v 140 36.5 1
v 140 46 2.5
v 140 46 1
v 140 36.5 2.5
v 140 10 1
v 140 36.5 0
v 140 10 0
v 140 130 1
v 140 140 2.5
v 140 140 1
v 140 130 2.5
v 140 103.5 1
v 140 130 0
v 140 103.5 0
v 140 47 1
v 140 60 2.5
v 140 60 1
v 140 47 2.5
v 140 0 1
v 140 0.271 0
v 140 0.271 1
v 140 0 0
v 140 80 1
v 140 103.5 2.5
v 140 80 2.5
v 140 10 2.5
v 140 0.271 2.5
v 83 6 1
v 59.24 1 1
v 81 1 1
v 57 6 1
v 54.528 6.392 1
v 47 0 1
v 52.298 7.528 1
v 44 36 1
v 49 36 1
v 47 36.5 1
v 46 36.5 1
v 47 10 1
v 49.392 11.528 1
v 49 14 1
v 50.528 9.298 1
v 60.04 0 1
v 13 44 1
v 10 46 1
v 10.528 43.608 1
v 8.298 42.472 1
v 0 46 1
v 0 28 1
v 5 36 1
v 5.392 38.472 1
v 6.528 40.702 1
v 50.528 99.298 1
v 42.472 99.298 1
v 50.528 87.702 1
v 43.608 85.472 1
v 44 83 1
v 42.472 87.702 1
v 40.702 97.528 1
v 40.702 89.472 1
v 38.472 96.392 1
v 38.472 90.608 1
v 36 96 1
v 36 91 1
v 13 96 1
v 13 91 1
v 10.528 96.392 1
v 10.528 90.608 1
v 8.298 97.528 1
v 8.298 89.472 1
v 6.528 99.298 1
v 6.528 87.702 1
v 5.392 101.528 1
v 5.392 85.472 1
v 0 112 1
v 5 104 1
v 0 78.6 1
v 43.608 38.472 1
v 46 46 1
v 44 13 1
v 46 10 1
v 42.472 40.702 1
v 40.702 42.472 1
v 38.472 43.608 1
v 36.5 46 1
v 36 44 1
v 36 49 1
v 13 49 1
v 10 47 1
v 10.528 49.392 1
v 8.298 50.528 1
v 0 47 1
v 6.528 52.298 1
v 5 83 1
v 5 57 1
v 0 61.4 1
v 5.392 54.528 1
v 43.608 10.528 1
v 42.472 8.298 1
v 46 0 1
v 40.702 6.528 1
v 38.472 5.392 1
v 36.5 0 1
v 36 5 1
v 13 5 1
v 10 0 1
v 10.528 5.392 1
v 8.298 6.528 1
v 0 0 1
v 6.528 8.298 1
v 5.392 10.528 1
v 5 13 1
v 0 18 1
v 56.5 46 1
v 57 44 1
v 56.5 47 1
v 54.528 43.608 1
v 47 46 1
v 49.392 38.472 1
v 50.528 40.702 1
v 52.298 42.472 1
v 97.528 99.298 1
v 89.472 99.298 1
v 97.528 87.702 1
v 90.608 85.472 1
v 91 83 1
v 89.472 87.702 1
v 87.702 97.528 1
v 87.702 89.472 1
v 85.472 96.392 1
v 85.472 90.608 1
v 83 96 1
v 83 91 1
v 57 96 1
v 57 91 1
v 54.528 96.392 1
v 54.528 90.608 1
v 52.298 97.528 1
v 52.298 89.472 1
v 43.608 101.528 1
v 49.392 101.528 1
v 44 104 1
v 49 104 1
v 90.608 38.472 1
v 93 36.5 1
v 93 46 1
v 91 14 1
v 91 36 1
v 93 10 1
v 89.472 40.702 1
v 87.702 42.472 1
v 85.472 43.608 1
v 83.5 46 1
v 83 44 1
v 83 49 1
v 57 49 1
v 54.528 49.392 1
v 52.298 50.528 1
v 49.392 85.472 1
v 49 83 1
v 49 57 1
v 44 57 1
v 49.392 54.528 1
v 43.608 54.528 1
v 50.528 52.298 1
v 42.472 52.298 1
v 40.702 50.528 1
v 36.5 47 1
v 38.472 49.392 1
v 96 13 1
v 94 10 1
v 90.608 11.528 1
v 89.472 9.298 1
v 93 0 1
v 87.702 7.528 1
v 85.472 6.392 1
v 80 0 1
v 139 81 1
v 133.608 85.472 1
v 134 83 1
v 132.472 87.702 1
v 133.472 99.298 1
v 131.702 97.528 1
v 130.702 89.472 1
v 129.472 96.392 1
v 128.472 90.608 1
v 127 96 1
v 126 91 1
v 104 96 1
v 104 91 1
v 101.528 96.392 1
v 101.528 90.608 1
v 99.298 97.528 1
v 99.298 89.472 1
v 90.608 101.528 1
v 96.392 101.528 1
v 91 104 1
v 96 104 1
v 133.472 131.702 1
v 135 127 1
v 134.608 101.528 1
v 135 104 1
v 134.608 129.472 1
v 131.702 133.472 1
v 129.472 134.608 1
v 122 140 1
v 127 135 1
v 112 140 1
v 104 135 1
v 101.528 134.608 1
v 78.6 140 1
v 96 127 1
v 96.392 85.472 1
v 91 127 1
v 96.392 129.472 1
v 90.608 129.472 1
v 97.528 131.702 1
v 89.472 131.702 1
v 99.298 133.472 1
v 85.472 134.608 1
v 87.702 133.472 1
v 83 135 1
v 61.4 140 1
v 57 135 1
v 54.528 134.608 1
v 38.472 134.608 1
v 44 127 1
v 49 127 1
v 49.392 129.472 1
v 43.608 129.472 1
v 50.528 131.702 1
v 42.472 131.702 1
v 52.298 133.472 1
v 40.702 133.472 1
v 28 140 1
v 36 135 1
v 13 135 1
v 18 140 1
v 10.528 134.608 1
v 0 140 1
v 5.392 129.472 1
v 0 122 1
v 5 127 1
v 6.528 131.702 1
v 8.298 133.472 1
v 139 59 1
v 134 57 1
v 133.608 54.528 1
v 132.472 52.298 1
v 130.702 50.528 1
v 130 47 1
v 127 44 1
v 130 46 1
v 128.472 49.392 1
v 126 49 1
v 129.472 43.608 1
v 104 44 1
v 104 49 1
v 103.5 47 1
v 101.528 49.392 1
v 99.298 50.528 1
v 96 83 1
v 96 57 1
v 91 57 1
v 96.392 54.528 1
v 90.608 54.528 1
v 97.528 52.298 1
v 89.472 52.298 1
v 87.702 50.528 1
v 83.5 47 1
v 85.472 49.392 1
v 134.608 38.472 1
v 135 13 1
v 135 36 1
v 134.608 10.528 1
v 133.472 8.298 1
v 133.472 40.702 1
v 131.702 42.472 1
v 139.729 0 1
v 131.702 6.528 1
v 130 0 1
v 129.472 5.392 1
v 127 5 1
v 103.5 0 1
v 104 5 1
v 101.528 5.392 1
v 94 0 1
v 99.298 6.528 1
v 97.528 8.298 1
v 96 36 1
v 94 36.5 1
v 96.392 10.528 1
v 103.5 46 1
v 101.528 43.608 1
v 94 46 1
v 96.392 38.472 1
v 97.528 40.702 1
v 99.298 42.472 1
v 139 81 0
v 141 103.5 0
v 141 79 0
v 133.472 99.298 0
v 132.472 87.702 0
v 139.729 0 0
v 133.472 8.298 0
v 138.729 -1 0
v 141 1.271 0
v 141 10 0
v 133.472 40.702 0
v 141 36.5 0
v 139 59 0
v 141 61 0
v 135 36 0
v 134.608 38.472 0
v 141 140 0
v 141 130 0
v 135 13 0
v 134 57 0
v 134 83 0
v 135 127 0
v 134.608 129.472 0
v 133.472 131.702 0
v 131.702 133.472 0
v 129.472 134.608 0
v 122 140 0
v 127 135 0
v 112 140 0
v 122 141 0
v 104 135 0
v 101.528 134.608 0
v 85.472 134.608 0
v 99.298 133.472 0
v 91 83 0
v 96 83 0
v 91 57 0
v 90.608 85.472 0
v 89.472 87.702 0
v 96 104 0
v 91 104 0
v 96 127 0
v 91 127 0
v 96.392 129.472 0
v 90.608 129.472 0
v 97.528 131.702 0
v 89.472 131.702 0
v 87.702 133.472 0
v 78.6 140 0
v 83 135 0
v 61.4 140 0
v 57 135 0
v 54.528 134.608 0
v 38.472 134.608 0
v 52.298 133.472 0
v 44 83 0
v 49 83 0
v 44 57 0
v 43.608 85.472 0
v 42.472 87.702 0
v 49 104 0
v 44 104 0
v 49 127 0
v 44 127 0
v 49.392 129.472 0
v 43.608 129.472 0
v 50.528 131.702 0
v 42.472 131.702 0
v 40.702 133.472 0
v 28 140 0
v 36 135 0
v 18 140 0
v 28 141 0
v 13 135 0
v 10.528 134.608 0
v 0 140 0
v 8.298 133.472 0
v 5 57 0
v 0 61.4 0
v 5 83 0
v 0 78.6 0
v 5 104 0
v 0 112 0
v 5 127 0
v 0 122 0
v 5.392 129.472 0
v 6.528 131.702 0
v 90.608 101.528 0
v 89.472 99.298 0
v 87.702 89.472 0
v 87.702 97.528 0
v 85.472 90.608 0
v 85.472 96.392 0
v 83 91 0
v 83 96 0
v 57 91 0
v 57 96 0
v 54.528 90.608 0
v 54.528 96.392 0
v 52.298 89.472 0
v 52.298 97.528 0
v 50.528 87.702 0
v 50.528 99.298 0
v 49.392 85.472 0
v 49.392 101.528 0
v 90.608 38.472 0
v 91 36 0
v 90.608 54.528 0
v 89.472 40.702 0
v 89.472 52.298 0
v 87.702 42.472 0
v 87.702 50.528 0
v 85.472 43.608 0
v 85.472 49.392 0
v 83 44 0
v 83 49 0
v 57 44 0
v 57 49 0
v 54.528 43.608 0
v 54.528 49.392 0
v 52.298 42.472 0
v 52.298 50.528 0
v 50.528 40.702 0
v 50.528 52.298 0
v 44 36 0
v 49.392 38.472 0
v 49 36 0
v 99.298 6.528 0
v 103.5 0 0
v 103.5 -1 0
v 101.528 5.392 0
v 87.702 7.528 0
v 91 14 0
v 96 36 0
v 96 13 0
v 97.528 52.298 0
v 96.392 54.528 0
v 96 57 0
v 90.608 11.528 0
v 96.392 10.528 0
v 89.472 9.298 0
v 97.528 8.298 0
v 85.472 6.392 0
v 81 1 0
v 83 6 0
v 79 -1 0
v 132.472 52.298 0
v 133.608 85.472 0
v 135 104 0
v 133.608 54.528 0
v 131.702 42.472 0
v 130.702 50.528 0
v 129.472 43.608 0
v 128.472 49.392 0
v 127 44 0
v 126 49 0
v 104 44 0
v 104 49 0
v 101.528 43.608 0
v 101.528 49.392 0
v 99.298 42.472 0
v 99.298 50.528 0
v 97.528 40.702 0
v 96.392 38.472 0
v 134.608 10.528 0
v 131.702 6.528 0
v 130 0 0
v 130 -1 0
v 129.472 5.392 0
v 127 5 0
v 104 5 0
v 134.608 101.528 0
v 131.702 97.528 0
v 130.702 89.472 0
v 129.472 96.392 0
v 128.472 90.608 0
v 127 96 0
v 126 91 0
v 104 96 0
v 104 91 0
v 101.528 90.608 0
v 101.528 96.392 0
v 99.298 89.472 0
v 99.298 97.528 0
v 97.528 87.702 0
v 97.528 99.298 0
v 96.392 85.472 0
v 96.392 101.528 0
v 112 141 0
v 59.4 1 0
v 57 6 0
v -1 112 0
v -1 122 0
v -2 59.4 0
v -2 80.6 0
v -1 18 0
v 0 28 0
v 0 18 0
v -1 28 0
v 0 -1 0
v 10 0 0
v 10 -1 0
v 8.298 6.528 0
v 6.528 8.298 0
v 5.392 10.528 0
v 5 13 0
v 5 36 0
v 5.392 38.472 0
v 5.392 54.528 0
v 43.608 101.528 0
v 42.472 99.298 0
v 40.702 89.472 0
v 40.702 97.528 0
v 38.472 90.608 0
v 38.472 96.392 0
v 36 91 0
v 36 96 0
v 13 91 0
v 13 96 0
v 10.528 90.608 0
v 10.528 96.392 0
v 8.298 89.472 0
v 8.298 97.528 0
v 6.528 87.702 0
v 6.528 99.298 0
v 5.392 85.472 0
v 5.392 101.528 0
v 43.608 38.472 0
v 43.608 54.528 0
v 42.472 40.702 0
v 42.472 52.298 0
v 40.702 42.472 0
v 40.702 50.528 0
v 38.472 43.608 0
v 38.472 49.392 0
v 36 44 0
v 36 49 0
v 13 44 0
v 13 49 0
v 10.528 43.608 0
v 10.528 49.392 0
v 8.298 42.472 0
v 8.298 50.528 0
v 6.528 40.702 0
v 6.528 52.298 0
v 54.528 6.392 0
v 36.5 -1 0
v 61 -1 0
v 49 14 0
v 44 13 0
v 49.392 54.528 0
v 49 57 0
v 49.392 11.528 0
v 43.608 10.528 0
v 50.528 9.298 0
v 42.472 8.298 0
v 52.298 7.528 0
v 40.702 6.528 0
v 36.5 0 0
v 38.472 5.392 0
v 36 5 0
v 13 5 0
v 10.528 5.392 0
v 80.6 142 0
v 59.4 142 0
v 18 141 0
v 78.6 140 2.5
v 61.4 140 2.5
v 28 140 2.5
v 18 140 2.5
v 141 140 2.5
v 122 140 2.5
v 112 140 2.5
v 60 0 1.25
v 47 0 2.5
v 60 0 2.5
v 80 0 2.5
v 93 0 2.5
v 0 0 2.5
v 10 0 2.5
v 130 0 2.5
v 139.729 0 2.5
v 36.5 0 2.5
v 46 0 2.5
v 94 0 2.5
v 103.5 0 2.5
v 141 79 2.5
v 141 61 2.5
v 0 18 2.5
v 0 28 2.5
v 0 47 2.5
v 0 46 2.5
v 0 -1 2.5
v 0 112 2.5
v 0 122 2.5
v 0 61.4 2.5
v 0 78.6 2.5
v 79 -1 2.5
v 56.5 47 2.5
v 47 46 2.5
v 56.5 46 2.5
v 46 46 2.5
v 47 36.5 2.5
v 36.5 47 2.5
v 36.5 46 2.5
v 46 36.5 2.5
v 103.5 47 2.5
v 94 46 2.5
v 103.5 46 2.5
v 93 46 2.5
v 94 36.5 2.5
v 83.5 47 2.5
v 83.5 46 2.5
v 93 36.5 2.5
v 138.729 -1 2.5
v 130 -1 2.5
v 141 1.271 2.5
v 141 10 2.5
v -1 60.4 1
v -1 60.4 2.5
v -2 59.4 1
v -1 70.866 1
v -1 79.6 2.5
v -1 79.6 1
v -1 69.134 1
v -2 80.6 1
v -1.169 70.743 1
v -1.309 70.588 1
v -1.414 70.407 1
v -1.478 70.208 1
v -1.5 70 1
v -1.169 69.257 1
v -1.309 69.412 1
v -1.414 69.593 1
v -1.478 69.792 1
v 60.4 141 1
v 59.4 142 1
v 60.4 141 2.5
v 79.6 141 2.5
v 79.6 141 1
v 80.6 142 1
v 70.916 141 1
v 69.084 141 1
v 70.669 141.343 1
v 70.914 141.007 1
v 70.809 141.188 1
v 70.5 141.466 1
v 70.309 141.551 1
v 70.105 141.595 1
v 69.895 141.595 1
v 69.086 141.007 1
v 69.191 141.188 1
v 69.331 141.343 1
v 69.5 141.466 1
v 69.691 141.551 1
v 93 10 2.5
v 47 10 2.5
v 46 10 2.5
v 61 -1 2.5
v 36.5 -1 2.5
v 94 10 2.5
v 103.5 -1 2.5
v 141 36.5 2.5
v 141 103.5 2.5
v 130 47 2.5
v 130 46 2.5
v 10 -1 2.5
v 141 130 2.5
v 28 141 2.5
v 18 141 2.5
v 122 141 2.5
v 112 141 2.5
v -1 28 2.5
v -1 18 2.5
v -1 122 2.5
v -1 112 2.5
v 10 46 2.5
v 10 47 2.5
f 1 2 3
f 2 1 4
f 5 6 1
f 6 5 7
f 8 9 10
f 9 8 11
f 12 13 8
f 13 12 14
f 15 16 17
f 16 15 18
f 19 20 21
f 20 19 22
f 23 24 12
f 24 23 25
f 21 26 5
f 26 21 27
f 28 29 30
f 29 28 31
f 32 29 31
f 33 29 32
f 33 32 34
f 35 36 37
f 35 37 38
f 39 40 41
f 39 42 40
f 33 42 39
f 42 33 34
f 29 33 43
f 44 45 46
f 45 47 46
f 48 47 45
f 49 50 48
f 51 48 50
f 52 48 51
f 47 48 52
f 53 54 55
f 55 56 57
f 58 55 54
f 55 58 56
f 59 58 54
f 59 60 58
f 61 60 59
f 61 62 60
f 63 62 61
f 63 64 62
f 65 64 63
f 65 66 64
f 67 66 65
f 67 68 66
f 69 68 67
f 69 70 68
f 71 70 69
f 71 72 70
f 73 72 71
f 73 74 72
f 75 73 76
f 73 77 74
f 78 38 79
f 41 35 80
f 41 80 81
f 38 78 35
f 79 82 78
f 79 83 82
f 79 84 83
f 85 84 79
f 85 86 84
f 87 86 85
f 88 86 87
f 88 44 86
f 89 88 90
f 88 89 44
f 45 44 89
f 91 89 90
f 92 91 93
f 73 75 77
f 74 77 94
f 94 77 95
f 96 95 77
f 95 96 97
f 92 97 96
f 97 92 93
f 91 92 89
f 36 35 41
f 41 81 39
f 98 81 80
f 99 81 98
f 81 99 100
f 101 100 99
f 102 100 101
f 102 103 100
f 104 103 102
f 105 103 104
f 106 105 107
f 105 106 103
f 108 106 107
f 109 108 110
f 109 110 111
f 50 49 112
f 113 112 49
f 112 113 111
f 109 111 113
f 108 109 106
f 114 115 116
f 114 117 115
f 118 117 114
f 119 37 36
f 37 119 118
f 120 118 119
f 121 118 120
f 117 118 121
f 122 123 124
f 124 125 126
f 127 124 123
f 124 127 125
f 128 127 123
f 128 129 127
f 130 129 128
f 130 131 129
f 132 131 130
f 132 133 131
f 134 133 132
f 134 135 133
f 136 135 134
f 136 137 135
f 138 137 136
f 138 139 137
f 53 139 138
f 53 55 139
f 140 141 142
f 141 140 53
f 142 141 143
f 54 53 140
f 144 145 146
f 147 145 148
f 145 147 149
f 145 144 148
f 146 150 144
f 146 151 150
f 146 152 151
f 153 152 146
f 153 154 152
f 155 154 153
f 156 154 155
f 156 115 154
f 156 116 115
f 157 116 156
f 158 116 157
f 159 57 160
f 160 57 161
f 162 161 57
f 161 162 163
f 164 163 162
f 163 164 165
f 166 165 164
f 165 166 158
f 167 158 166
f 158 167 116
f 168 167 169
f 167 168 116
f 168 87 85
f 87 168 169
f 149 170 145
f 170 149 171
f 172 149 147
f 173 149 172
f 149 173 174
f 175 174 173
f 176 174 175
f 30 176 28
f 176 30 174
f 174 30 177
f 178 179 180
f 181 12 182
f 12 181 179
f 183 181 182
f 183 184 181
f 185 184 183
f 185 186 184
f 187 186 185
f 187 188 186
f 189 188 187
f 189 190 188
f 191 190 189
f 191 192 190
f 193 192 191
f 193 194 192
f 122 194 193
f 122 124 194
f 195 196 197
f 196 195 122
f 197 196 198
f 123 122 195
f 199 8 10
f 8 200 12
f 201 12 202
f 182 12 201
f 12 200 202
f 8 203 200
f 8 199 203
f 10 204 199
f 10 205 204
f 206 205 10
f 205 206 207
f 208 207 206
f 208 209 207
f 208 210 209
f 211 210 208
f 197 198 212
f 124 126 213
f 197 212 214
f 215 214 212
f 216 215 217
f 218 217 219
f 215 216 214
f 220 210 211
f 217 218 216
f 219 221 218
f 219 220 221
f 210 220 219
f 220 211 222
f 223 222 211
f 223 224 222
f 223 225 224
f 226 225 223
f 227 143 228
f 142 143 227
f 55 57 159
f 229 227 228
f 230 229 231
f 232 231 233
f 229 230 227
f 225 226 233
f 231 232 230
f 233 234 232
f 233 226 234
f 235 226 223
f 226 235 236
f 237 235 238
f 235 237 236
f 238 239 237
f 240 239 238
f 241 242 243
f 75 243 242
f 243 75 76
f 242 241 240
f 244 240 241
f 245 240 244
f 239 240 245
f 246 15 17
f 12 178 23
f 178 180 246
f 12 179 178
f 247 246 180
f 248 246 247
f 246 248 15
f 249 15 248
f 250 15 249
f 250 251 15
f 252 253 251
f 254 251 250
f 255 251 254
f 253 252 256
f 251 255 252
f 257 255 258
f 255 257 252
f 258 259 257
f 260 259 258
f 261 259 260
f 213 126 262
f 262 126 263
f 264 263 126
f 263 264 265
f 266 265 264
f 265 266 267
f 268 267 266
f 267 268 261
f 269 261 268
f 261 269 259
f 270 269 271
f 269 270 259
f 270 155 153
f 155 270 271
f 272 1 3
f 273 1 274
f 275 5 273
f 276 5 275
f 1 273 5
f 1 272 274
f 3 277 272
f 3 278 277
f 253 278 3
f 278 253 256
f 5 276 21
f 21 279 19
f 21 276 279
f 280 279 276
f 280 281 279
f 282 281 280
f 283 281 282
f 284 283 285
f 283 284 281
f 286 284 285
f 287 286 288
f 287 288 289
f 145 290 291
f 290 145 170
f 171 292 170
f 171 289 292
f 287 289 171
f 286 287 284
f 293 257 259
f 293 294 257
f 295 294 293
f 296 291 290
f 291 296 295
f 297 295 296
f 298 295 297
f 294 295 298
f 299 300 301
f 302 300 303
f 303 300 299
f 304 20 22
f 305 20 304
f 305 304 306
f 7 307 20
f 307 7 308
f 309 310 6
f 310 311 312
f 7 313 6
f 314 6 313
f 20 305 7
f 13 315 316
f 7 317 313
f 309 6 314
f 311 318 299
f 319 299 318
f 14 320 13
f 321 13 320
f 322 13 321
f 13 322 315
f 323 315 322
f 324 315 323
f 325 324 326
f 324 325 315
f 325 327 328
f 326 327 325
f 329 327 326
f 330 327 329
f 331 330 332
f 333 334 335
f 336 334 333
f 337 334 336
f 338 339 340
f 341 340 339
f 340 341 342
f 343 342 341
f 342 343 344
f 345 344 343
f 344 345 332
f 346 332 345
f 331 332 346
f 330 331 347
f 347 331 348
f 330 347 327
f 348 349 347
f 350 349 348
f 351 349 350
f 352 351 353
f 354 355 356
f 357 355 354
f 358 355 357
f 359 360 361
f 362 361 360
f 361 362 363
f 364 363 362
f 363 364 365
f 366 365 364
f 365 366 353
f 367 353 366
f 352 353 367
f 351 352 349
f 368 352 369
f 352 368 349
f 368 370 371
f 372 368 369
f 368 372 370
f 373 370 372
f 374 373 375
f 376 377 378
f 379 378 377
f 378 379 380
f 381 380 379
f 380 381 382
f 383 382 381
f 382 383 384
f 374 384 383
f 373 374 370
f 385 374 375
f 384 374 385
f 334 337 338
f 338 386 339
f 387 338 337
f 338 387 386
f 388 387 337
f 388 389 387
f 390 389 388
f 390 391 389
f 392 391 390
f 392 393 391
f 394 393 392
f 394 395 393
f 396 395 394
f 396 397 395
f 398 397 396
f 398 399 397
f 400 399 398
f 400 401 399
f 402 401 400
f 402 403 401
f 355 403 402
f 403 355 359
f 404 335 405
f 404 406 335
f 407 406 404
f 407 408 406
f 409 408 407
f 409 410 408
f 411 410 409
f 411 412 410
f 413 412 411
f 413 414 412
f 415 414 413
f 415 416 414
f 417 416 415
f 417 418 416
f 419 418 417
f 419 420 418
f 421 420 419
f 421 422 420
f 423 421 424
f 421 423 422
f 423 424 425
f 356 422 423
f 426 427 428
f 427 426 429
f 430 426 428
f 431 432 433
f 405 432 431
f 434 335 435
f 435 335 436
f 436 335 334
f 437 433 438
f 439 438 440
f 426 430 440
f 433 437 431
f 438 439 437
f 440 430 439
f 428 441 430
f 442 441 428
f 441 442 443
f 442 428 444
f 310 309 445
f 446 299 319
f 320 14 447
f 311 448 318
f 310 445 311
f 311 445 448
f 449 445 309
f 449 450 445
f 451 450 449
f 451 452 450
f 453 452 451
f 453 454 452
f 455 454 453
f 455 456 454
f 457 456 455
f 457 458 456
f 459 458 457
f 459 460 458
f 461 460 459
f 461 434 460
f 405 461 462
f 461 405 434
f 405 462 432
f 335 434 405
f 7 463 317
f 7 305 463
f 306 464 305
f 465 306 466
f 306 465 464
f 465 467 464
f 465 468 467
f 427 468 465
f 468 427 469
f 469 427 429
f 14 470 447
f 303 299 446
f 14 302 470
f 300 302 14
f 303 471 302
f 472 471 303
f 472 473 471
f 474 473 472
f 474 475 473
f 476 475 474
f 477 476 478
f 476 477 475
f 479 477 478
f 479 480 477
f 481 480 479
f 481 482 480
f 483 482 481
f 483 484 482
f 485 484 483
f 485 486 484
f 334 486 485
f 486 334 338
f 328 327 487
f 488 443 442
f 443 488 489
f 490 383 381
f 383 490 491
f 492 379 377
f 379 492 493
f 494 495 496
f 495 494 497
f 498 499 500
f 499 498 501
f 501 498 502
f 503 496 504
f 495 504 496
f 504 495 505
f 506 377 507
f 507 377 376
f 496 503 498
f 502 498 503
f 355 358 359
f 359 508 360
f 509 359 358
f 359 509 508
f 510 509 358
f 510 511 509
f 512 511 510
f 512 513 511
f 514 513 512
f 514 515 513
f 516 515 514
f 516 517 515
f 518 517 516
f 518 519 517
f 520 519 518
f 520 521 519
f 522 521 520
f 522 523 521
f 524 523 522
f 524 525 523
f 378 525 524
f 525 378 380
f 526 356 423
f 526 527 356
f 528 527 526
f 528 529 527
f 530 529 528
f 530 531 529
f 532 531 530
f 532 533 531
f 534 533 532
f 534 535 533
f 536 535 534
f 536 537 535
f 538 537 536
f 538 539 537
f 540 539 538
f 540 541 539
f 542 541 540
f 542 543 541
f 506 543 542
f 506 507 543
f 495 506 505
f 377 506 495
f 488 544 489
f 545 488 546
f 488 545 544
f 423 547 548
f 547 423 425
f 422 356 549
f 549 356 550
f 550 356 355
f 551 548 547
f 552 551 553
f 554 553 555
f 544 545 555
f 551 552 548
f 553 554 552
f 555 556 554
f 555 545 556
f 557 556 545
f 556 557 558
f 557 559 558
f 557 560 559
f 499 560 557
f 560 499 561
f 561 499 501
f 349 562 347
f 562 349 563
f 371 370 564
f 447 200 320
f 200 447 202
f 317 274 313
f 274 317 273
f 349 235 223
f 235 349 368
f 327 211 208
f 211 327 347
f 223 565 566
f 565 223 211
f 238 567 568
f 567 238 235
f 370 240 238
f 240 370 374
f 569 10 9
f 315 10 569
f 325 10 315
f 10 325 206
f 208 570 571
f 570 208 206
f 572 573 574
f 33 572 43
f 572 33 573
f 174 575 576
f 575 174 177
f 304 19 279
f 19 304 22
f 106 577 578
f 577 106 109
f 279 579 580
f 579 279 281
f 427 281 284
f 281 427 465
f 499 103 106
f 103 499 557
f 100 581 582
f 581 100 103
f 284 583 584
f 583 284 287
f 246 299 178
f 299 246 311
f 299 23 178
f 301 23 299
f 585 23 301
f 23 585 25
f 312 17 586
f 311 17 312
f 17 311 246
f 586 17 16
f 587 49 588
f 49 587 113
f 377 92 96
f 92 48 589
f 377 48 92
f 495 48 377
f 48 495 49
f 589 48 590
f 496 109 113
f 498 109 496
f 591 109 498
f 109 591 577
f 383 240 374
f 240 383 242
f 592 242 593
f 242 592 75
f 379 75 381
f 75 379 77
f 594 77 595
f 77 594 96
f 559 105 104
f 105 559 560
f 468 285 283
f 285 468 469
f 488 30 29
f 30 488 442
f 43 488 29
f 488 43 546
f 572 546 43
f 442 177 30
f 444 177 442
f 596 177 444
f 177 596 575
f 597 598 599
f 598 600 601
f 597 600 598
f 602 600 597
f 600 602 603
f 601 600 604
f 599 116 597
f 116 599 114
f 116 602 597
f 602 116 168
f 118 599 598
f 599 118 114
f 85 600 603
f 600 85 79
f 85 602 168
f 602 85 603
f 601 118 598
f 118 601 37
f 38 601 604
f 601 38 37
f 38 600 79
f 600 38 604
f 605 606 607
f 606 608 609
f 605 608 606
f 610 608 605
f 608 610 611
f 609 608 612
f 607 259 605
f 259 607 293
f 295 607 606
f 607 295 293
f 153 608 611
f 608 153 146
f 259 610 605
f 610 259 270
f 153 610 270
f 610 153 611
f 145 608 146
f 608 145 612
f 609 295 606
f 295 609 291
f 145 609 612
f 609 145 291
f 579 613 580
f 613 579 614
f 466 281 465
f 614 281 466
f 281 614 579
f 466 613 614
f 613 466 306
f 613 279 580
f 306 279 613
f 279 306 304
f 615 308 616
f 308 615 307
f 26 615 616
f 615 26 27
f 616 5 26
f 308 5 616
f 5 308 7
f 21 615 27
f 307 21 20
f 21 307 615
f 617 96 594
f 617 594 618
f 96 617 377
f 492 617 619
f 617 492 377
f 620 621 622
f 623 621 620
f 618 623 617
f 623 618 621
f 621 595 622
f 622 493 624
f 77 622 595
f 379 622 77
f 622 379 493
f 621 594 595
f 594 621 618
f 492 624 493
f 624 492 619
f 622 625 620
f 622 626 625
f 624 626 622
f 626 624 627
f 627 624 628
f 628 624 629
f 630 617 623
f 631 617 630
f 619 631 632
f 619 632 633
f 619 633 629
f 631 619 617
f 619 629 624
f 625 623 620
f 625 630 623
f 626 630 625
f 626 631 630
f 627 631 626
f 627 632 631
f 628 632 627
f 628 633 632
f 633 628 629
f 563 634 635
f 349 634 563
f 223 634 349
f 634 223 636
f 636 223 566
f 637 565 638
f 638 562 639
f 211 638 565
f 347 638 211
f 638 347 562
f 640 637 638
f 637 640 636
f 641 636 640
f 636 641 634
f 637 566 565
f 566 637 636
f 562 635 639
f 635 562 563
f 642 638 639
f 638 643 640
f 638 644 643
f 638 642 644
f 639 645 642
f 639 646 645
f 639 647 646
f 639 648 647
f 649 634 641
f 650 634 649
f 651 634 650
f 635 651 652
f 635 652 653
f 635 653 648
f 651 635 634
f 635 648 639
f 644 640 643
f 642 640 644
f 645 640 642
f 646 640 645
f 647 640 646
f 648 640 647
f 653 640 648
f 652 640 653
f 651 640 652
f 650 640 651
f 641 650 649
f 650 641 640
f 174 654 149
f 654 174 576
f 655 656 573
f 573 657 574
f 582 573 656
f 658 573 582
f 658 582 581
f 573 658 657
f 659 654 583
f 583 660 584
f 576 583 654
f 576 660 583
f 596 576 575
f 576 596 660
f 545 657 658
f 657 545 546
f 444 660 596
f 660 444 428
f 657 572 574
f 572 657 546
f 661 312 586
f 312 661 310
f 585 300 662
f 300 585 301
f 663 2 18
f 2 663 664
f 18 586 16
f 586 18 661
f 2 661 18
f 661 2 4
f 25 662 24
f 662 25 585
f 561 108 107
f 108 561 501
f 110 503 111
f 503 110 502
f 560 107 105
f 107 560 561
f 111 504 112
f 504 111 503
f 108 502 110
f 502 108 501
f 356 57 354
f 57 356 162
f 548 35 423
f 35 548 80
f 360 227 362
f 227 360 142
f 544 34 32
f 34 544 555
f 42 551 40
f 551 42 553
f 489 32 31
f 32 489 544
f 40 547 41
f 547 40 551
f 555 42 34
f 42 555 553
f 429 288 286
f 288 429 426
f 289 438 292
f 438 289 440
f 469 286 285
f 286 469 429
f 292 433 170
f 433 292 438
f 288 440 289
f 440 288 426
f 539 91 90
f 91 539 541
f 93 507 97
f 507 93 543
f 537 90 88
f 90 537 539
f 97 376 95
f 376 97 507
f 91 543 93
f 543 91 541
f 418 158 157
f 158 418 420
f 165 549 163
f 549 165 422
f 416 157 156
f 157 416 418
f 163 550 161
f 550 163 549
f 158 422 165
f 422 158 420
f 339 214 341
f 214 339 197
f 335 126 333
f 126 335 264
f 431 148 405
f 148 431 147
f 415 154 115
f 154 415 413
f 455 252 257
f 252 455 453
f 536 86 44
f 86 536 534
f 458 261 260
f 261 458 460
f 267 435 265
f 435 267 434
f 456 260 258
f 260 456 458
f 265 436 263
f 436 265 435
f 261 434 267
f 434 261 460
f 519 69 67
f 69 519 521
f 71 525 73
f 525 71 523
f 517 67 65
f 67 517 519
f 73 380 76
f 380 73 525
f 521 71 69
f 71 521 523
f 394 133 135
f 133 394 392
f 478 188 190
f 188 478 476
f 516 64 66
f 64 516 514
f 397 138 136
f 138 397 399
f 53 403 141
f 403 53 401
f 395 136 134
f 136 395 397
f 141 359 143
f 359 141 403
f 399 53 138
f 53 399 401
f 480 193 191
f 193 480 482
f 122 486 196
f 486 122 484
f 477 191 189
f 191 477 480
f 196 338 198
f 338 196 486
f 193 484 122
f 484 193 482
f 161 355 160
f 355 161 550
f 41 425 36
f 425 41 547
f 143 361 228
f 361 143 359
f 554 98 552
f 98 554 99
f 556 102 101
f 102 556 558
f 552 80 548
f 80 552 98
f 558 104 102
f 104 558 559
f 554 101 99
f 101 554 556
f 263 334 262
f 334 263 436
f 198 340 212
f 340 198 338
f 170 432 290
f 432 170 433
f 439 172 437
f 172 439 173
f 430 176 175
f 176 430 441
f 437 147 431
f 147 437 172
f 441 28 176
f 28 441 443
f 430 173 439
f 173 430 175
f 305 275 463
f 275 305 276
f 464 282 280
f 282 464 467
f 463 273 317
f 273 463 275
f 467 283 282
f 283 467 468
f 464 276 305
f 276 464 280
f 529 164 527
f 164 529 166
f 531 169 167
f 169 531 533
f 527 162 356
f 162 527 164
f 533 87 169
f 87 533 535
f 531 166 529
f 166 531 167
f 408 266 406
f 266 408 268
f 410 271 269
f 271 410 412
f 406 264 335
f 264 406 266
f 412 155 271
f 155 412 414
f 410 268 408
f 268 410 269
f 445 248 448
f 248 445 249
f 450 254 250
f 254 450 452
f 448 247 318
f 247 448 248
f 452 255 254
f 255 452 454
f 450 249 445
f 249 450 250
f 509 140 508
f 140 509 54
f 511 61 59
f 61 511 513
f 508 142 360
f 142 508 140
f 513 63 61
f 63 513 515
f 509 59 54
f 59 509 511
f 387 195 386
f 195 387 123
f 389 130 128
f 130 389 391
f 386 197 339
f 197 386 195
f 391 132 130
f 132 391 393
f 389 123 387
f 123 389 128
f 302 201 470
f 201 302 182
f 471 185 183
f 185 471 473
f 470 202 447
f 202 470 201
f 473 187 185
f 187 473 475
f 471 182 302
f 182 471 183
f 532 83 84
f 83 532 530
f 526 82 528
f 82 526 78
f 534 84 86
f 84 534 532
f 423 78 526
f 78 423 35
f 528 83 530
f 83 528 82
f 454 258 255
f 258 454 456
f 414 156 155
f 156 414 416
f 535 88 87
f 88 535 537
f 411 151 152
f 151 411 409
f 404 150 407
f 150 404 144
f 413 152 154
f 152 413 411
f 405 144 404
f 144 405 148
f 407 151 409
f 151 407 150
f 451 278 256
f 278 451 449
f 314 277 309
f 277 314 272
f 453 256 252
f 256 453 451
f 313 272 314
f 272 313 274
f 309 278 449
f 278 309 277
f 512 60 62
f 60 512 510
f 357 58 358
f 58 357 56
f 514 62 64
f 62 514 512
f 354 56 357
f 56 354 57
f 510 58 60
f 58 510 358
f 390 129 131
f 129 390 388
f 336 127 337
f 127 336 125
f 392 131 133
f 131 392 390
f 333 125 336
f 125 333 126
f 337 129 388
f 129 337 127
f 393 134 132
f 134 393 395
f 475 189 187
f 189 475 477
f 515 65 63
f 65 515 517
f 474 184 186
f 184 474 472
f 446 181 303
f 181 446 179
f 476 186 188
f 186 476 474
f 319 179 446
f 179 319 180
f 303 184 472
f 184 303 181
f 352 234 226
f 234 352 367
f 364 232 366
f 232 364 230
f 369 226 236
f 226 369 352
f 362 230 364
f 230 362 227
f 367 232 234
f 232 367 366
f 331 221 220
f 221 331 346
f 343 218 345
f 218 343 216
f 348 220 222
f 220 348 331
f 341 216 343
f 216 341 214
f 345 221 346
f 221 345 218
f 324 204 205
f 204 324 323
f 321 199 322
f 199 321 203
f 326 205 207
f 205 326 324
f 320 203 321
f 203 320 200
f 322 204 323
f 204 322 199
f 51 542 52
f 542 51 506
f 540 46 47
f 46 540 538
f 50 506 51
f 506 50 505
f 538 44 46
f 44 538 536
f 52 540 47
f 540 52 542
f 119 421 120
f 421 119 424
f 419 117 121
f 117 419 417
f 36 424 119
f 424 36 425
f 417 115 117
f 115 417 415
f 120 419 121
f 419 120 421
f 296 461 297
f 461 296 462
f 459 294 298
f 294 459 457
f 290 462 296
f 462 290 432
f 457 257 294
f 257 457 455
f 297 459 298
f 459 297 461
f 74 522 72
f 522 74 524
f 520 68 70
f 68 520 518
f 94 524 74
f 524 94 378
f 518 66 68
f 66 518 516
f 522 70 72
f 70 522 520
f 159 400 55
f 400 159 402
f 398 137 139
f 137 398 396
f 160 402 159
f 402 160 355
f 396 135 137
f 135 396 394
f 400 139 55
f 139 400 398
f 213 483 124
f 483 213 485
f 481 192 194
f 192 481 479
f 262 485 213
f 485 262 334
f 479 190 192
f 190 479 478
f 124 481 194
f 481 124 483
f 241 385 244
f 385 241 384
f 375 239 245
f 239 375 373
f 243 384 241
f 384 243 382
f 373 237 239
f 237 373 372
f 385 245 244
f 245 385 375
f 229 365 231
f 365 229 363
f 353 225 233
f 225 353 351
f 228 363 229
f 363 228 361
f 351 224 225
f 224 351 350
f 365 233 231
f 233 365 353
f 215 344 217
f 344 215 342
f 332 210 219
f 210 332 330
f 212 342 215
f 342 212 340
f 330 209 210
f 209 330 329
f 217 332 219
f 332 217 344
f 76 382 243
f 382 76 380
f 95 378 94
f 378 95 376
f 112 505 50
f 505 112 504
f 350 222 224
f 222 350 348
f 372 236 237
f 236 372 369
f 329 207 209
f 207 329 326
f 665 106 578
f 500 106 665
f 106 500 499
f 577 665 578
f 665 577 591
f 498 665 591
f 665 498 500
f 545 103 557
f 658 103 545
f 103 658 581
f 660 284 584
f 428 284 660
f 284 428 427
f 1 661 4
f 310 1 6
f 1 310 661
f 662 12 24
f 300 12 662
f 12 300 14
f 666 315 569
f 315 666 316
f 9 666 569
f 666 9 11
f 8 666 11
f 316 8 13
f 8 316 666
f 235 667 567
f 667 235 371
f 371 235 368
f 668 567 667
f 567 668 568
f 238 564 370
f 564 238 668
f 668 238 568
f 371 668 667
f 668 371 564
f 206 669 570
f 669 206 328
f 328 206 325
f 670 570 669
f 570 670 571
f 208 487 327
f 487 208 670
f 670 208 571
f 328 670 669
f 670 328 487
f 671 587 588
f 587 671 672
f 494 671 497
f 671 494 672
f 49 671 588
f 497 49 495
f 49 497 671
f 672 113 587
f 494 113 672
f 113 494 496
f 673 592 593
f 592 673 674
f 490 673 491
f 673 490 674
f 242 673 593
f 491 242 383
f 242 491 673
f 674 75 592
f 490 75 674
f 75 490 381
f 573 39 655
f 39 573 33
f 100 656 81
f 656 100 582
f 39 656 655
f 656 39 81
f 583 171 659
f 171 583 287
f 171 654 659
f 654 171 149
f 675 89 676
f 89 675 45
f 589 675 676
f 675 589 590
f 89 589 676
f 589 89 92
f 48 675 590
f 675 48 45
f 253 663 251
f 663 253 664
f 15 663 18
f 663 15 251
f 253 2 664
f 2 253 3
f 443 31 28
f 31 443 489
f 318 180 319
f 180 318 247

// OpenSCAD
baseheight = 1;
wallheight = 2.5;
wallwidth = 1;
crosslength = 20;
tileside = 46;
floorwidth = 5;
totalwidth = 3*tileside+2*wallwidth;
firstdividecenter = tileside+wallwidth/2;
seconddividecenter = tileside*2+wallwidth+wallwidth/2;
centerfirsttile = tileside/2;
centersecondtile = tileside+wallwidth+tileside/2;
centerthirdtile = tileside*2+wallwidth*2+tileside/2;
dovewidth = 17.2;
negdovewidth = 18;
cornerradius = 8; //4;

module centercross (xpos, ypos, zpos) {
	translate( [xpos, ypos, zpos]) 
		translate ([-crosslength/2,-wallwidth/2, 0]) cube ([crosslength, wallwidth, wallheight]);
	translate ( [xpos, ypos, zpos])
		translate ([-wallwidth/2,-crosslength/2, 0]) cube ([wallwidth, crosslength, wallheight]);
} // module

module centerT (xpos, ypos, zpos, rotation) {
    translate( [xpos, ypos, zpos]) rotate([0, 0, rotation]) 
        translate ([-crosslength/2,-wallwidth/2, 0]) cube ([crosslength, wallwidth, wallheight]);
    translate ( [xpos, ypos, zpos]) rotate([0, 0, rotation]) 
        translate ([-wallwidth/2,0, 0]) cube ([wallwidth, crosslength/2, wallheight]);
} // module

module corner (xpos, ypos, zpos) {
	translate ( [xpos, ypos, zpos]) 
	difference () {
		cube ([floorwidth+cornerradius, floorwidth+cornerradius, baseheight]);
		translate ([floorwidth+cornerradius, floorwidth+cornerradius, 0]) cylinder (3, r=cornerradius, $fn=20);
	} // difference
} // module corner

// y-direction floorbeams - translate to near edge of beam, then draw
cube ([floorwidth, totalwidth, baseheight]);
translate ([firstdividecenter-floorwidth/2, 0, 0]) cube ([floorwidth, totalwidth, baseheight]);
translate ([tileside+wallwidth+tileside+wallwidth/2-floorwidth/2, 0, 0]) cube ([floorwidth, totalwidth, baseheight]);

difference () {
    //wall fill for dovetail
    translate ([totalwidth-floorwidth, 0, 0]) cube ([floorwidth, totalwidth, baseheight]);

    //negative dovetail far y axis
    translate([totalwidth+wallwidth, tileside+wallwidth+tileside/2, 0])  
        polyhedron  (
        points = [[0, -negdovewidth/2 ,0], [0, -negdovewidth/2, wallheight], [0,negdovewidth/2,wallheight], [0,negdovewidth/2,0], 
            [-wallwidth*2, negdovewidth/2+2, 0], [-wallwidth*2, negdovewidth/2+2, wallheight], 
            [-wallwidth*2, -negdovewidth/2-2, wallheight], [-wallwidth*2, -negdovewidth/2-2, 0]],
        faces = [[0,1,2], [2,3,0], [4,5,6], [6,7,4],
             [0,7,6], [6,1,0], [3,2,5], [5,4,3],
            [1,6,5], [5,2,1], [0,3,4], [4,7,0],  ]);
} // difference

// x-direction floorbeams - translate to near edge of beam, then draw

difference () {
cube([totalwidth,floorwidth,baseheight]);

// negative dovetail near x axis
translate ([tileside+wallwidth+tileside/2, -wallwidth,0])  
	polyhedron  (
	points = [[-negdovewidth/2, 0, 0], [-negdovewidth/2, 0, wallheight], 
		[negdovewidth/2,0, wallheight], [negdovewidth/2, 0, 0], 
		[negdovewidth/2+2, wallwidth*2,0], [negdovewidth/2+2, wallwidth*2, wallheight], 
		[-negdovewidth/2-2, wallwidth*2, wallheight], [-dovewidth/2-2, wallwidth*2, 0]],
	faces = [[0, 1, 2], [2, 3, 0], [4, 5, 6], [6, 7, 4],
		 [0, 7, 6], [6, 1, 0], [3, 2, 5], [5, 4, 3],
		[1, 6, 5], [5, 2, 1], [0, 3, 4], [4, 7, 0],  ]);
} // difference

translate ([0, firstdividecenter-floorwidth/2, 0]) cube ([totalwidth, floorwidth, baseheight]);
translate ([0, tileside+wallwidth+tileside+wallwidth/2-floorwidth/2, 0]) cube ([totalwidth, floorwidth, baseheight]);
translate ([0, totalwidth-floorwidth,0]) cube ([totalwidth, floorwidth, baseheight]);

// four center crosses - translate to center of cross, then translate back and draw
 centerT (firstdividecenter, firstdividecenter, 0, 180);
//centerT (firstdividecenter, seconddividecenter, 0);
 centerT (seconddividecenter, firstdividecenter, 0, 180);
//centerT (seconddividecenter, seconddividecenter, 0);

//walls on x-axis
 translate ([0, -wallwidth, 0]) cube ([crosslength/2, wallwidth, wallheight]);
 translate ([tileside+wallwidth/2-crosslength/2, -wallwidth,0]) cube ([crosslength, wallwidth, wallheight]);
translate ([tileside*2+wallwidth+wallwidth/2-wallwidth/2, -wallwidth, 0]) cube ([crosslength/2+wallwidth/2, wallwidth, wallheight]);

difference () {
    translate ([totalwidth-crosslength/2, -wallwidth, 0]) cube ([crosslength/2, wallwidth, wallheight]);
    translate ([totalwidth+2*wallwidth, -2.3*wallwidth-floorwidth/2, 0]) rotate (45) cube (floorwidth, floorwidth, wallheight);
} // difference

// walls on y-axis, far side

difference () {
translate ([totalwidth, -wallwidth,0]) cube ([wallwidth, crosslength/2+wallwidth, wallheight]);
translate ([totalwidth+2*wallwidth, -2.3*wallwidth-floorwidth/2, 0]) rotate (45) cube (floorwidth, floorwidth, wallheight);
} // difference

translate ([totalwidth, tileside+wallwidth/2-crosslength/2,0]) cube([wallwidth,crosslength,wallheight]);
translate ([totalwidth, tileside*2+wallwidth+wallwidth/2-crosslength/2,0]) cube ([wallwidth, crosslength, wallheight]);
translate ([totalwidth, totalwidth-crosslength/2, 0]) cube ([wallwidth, crosslength/2, wallheight]);

// walls on x-axis, far side
translate ([centerfirsttile - crosslength/4, totalwidth, 0]) cube ([crosslength/2, wallwidth, wallheight]);
 translate ([centersecondtile - crosslength/4, totalwidth, 0]) cube ([crosslength/2, wallwidth, wallheight]);
translate ([centerthirdtile - crosslength/4, totalwidth, 0]) cube ([crosslength/2, wallwidth, wallheight]);

// walls on y-axis, near side
 translate ([-wallwidth, centerfirsttile - crosslength/4, 0]) cube ([wallwidth, crosslength/2, wallheight]);
 translate ([-wallwidth, centersecondtile - crosslength/4, 0]) cube ([wallwidth, crosslength/2, wallheight]);
translate ([-wallwidth, centerthirdtile - crosslength/4, 0]) cube ([wallwidth, crosslength/2, wallheight]);

// "t's" off of walls, x-axis near
 translate ([firstdividecenter - wallwidth/2, 0, 0]) cube ([wallwidth, crosslength/2, wallheight]);
 translate ([seconddividecenter - wallwidth/2, 0, 0]) cube ([wallwidth, crosslength/2, wallheight]);
// "t's" off of walls, x-axis far
//  translate ([firstdividecenter - wallwidth/2,  totalwidth - crosslength/2, 0]) cube ([wallwidth, crosslength/2, wallheight]);
//  translate ([seconddividecenter - wallwidth/2,  totalwidth - crosslength/2, 0]) cube ([wallwidth, crosslength/2, wallheight]);
// "t's" off of walls, y-axis near
 translate ([0, firstdividecenter - wallwidth/2, 0]) cube ([crosslength/2,  wallwidth,  wallheight]);
//translate ([0, seconddividecenter - wallwidth/2, 0]) cube ([crosslength/2,  wallwidth,  wallheight]);
// "t's" off of walls, y-axis far
 translate ([totalwidth - crosslength/2,  firstdividecenter - wallwidth/2, 0]) cube ([crosslength/2, wallwidth, wallheight]);
//  translate ([totalwidth - crosslength/2,  seconddividecenter - wallwidth/2, 0]) cube ([crosslength/2, wallwidth, wallheight]);

// solid divider sections for dovetail
// translate ([totalwidth/2 - tileside/2,  -wallwidth, 0]) cube ([tileside, wallwidth, wallheight]);
// translate ([totalwidth, totalwidth/2 - tileside/2, 0]) cube ([wallwidth, tileside, wallheight]);



//dovetail near y axis
difference () {
translate ([0, tileside + wallwidth + tileside/2, 0])  {
	polyhedron  (
	points = [[0, -dovewidth/2, 0], [0, -dovewidth/2, wallheight], [0, dovewidth/2, wallheight], 
		[0, dovewidth/2,  0],  [-wallwidth, dovewidth/2 + 1, 0], [-wallwidth, dovewidth/2 + 1, wallheight], 
		[-wallwidth, -dovewidth/2-1, wallheight],  [-wallwidth, -dovewidth/2-1,  0]], 
	faces = [[0, 1, 2], [2, 3, 0], [4, 5, 6], [6, 7, 4], 
		 [0, 7, 6], [6, 1,  0], [3, 2, 5], [5, 4, 3], 
		[1, 6, 5], [5, 2, 1], [0, 3, 4], [4, 7, 0],  ]);
	polyhedron  (
	points = [[0,  -dovewidth/2,  0],  [0,  -dovewidth/2,  baseheight],  [0,  dovewidth/2,  baseheight],  
		[0,  dovewidth/2,  0],  [-wallwidth*2,  dovewidth/2 + 2,  0],  
		[-wallwidth*2,  dovewidth/2 + 2,  baseheight],  [-wallwidth*2,  -dovewidth/2 - 2,  baseheight],  
		[-wallwidth*2,  -dovewidth/2 - 2,  0]], 
	faces = [[0, 1, 2], [2, 3, 0], [4, 5, 6], [6, 7, 4], 
		 [0, 7, 6], [6, 1, 0], [3, 2, 5],  [5, 4, 3], 
		[1, 6, 5], [5, 2, 1], [0, 3, 4], [4, 7, 0], ]);
}  //translate
translate ([-.5, totalwidth/2, 1]) cylinder (h = 5, r=1, $fn = 30);
}

//dovetail far x axis
difference () {
translate ([tileside + wallwidth + tileside/2, totalwidth, 0]) { 
	polyhedron  (
	points = [[-dovewidth/2, 0, 0],  [-dovewidth/2, 0, wallheight],  [dovewidth/2, 0, wallheight],  
		[dovewidth/2, 0, 0],  [dovewidth/2 + 1, wallwidth, 0],  [dovewidth/2 + 1, wallwidth, wallheight],  
		[-dovewidth/2 - 1, wallwidth, wallheight],  	[-dovewidth/2 - 1, wallwidth, 0]], 
	faces = [[0, 1, 2],  [2, 3, 0],  [4, 5, 6],  [6, 7, 4], 
		 [0, 7, 6],  [6, 1, 0],  [3, 2, 5],  [5, 4, 3], 
		[1, 6, 5],  [5, 2, 1],  [0, 3, 4],  [4, 7, 0],   ]);
	polyhedron  (
	points = [[-dovewidth/2, 0, 0],  [-dovewidth/2, 0, baseheight],  [dovewidth/2, 0, baseheight],  
		[dovewidth/2, 0, 0],  [dovewidth/2 + 2, wallwidth*2, 0],  [dovewidth/2 + 2, wallwidth*2, baseheight],  
		[-dovewidth/2 - 2, wallwidth*2, baseheight],  [-dovewidth/2 - 2, wallwidth*2, 0]], 
	faces = [[0, 1, 2],  [2, 3, 0],  [4, 5, 6],  [6, 7, 4], 
		 [0, 7, 6],  [6, 1, 0],  [3, 2, 5],  [5, 4, 3], 
		[1, 6, 5],  [5, 2, 1],  [0, 3, 4],  [4, 7, 0],   ]);
} // translate
translate ([totalwidth/2, totalwidth+.6, 1]) cylinder (h = 5, r=1, $fn = 30);
}

//added base width near dovetail cutouts
translate ([firstdividecenter, floorwidth, 0]) cube([tileside + wallwidth*2,  wallwidth, baseheight]);
translate ([totalwidth - floorwidth - wallwidth, firstdividecenter, 0]) cube([wallwidth, tileside + wallwidth*2, baseheight]);

difference() {
//wall fill for dovetail
translate ([totalwidth/2 - tileside/2 , -wallwidth, 0]) cube([tileside, wallwidth, wallheight]);

//negative dovetail near x axis
translate ([tileside + wallwidth + tileside/2, -wallwidth, 0])  
	polyhedron  (
	points = [[-negdovewidth/2, 0, 0],  [-negdovewidth/2, 0, wallheight],  
		[negdovewidth/2, 0, wallheight],  [negdovewidth/2, 0, 0],  
		[negdovewidth/2 + 2, wallwidth*2, 0],  [negdovewidth/2 + 2, wallwidth*2, wallheight],  
		[-negdovewidth/2 - 2, wallwidth*2, wallheight],  [-dovewidth/2-2, wallwidth*2, 0]], 
	faces = [[0, 1, 2],  [2, 3, 0],  [4, 5, 6],  [6, 7, 4], 
		 [0, 7, 6],  [6, 1, 0],  [3, 2, 5],  [5, 4, 3], 
		[1, 6, 5],  [5, 2, 1],  [0, 3, 4],  [4, 7, 0],   ]);
	} // polyhedron

difference() {
//wall fill for dovetail
translate ([totalwidth, totalwidth/2-tileside/2, 0]) cube([wallwidth, tileside, wallheight]);

//negative dovetail far y axis
translate ([totalwidth + wallwidth, tileside + wallwidth + tileside/2, 0])  
	polyhedron  (
	points = [[0, -negdovewidth/2, 0],  [0, -negdovewidth/2, wallheight],  [0, negdovewidth/2, wallheight],  
		[0, negdovewidth/2, 0],  [-wallwidth*2, negdovewidth/2 + 2, 0],  
		[-wallwidth*2, negdovewidth/2 + 2, wallheight],  [-wallwidth*2, -negdovewidth/2-2, wallheight],  
		[-wallwidth*2, -negdovewidth/2 - 2, 0]], 
	faces = [[0, 1, 2],  [2, 3, 0],  [4, 5, 6],  [6, 7, 4], 
		 [0, 7, 6],  [6, 1, 0],  [3, 2, 5],  [5, 4, 3], 
		[1, 6, 5],  [5, 2, 1],  [0, 3, 4],  [4, 7, 0],   ]);
} // difference

corner (0, 0, 0);
corner (firstdividecenter + floorwidth/2 - floorwidth, wallwidth, 0);
corner (seconddividecenter + floorwidth/2 - floorwidth, 0, 0);
corner (0, firstdividecenter + floorwidth/2 - floorwidth, 0);
corner (firstdividecenter + floorwidth/2 - floorwidth, firstdividecenter + floorwidth/2 - floorwidth, 0);
corner (seconddividecenter + floorwidth/2 - floorwidth, firstdividecenter + floorwidth/2 - floorwidth, 0);
corner (0, seconddividecenter + floorwidth/2 - floorwidth, 0);
corner (firstdividecenter + floorwidth/2 - floorwidth, seconddividecenter + floorwidth/2 - floorwidth, 0);
corner (seconddividecenter + floorwidth/2 - floorwidth, seconddividecenter + floorwidth/2 - floorwidth, 0);

translate ([firstdividecenter + floorwidth/2, 0, 0])  { rotate (a = 90, v = [0, 0, 1]) { corner (0, 0, 0); }}
translate ([seconddividecenter + floorwidth/2, wallwidth, 0])  { rotate (a = 90, v = [0, 0, 1]) { corner (0, 0, 0); }}
translate ([totalwidth, 0, 0])  { rotate (a = 90, v = [0, 0, 1]) { corner (0, 0, 0); }}
translate ([firstdividecenter + floorwidth/2, firstdividecenter - floorwidth/2, 0])  { rotate (a = 90, v = [0, 0, 1]) { corner (0, 0, 0); }}
translate ([seconddividecenter + floorwidth/2, firstdividecenter - floorwidth/2, 0])  { rotate (a = 90, v = [0, 0, 1]) { corner (0, 0, 0); }}
translate ([totalwidth-wallwidth, firstdividecenter - floorwidth/2, 0])  { rotate (a = 90, v = [0, 0, 1]) { corner (0, 0, 0); }}
translate ([firstdividecenter + floorwidth/2, seconddividecenter - floorwidth/2, 0])  { rotate (a = 90, v = [0, 0, 1]) { corner (0, 0, 0); }}
translate ([seconddividecenter + floorwidth/2, seconddividecenter - floorwidth/2, 0])  { rotate (a = 90, v = [0, 0, 1]) { corner (0, 0, 0); }}
translate ([totalwidth, seconddividecenter - floorwidth/2, 0])  { rotate (a = 90, v = [0, 0, 1]) { corner (0, 0, 0); }}

translate ([firstdividecenter + floorwidth/2, firstdividecenter + floorwidth/2, 0])  { rotate (a = 180, v = [0, 0, 1]) { corner (0, 0, 0); }}
translate ([seconddividecenter + floorwidth/2, firstdividecenter + floorwidth/2, 0])  { rotate (a = 180, v = [0, 0, 1]) { corner (0, 0, 0); }}
translate ([totalwidth, firstdividecenter + floorwidth/2, 0])  { rotate (a = 180, v = [0, 0, 1]) { corner (0, 0, 0); }}
translate ([firstdividecenter + floorwidth/2, seconddividecenter + floorwidth/2, 0])  { rotate (a = 180, v = [0, 0, 1]) { corner (0, 0, 0); }}
translate ([seconddividecenter + floorwidth/2, seconddividecenter + floorwidth/2, 0])  { rotate (a = 180, v = [0, 0, 1]) { corner (0, 0, 0); }}
translate ([totalwidth-wallwidth, seconddividecenter + floorwidth/2, 0])  { rotate (a = 180, v = [0, 0, 1]) { corner (0, 0, 0); }}
translate ([firstdividecenter + floorwidth/2, totalwidth, 0])  { rotate (a = 180, v = [0, 0, 1]) { corner (0, 0, 0); }}
translate ([seconddividecenter + floorwidth/2, totalwidth, 0])  { rotate (a = 180, v = [0, 0, 1]) { corner (0, 0, 0); }}
translate ([totalwidth, totalwidth, 0])  { rotate (a = 180, v = [0, 0, 1]) { corner (0, 0, 0); }}

translate ([0, firstdividecenter + floorwidth/2, 0])  { rotate (a = 270, v = [0, 0, 1]) { corner (0, 0, 0); }}
translate ([firstdividecenter - floorwidth/2, firstdividecenter + floorwidth/2, 0])  { rotate (a = 270, v = [0, 0, 1]) { corner (0, 0, 0); }}
translate ([seconddividecenter - floorwidth/2, firstdividecenter + floorwidth/2, 0])  { rotate (a = 270, v = [0, 0, 1]) { corner (0, 0, 0); }}

translate ([0, seconddividecenter + floorwidth/2, 0])  { rotate (a = 270, v = [0, 0, 1]) { corner (0, 0, 0); }}
translate ([firstdividecenter - floorwidth/2, seconddividecenter + floorwidth/2, 0])  { rotate (a = 270, v = [0, 0, 1]) { corner (0, 0, 0); }}
translate ([seconddividecenter - floorwidth/2, seconddividecenter + floorwidth/2, 0])  { rotate (a = 270, v = [0, 0, 1]) { corner (0, 0, 0); }}

translate ([0, totalwidth, 0])  { rotate (a = 270, v = [0, 0, 1]) { corner (0, 0, 0); }}
translate ([firstdividecenter - floorwidth/2, totalwidth, 0])  { rotate (a = 270, v = [0, 0, 1]) { corner (0, 0, 0); }}
translate ([seconddividecenter - floorwidth/2, totalwidth, 0])  { rotate (a = 270, v = [0, 0, 1]) { corner (0, 0, 0); }}
